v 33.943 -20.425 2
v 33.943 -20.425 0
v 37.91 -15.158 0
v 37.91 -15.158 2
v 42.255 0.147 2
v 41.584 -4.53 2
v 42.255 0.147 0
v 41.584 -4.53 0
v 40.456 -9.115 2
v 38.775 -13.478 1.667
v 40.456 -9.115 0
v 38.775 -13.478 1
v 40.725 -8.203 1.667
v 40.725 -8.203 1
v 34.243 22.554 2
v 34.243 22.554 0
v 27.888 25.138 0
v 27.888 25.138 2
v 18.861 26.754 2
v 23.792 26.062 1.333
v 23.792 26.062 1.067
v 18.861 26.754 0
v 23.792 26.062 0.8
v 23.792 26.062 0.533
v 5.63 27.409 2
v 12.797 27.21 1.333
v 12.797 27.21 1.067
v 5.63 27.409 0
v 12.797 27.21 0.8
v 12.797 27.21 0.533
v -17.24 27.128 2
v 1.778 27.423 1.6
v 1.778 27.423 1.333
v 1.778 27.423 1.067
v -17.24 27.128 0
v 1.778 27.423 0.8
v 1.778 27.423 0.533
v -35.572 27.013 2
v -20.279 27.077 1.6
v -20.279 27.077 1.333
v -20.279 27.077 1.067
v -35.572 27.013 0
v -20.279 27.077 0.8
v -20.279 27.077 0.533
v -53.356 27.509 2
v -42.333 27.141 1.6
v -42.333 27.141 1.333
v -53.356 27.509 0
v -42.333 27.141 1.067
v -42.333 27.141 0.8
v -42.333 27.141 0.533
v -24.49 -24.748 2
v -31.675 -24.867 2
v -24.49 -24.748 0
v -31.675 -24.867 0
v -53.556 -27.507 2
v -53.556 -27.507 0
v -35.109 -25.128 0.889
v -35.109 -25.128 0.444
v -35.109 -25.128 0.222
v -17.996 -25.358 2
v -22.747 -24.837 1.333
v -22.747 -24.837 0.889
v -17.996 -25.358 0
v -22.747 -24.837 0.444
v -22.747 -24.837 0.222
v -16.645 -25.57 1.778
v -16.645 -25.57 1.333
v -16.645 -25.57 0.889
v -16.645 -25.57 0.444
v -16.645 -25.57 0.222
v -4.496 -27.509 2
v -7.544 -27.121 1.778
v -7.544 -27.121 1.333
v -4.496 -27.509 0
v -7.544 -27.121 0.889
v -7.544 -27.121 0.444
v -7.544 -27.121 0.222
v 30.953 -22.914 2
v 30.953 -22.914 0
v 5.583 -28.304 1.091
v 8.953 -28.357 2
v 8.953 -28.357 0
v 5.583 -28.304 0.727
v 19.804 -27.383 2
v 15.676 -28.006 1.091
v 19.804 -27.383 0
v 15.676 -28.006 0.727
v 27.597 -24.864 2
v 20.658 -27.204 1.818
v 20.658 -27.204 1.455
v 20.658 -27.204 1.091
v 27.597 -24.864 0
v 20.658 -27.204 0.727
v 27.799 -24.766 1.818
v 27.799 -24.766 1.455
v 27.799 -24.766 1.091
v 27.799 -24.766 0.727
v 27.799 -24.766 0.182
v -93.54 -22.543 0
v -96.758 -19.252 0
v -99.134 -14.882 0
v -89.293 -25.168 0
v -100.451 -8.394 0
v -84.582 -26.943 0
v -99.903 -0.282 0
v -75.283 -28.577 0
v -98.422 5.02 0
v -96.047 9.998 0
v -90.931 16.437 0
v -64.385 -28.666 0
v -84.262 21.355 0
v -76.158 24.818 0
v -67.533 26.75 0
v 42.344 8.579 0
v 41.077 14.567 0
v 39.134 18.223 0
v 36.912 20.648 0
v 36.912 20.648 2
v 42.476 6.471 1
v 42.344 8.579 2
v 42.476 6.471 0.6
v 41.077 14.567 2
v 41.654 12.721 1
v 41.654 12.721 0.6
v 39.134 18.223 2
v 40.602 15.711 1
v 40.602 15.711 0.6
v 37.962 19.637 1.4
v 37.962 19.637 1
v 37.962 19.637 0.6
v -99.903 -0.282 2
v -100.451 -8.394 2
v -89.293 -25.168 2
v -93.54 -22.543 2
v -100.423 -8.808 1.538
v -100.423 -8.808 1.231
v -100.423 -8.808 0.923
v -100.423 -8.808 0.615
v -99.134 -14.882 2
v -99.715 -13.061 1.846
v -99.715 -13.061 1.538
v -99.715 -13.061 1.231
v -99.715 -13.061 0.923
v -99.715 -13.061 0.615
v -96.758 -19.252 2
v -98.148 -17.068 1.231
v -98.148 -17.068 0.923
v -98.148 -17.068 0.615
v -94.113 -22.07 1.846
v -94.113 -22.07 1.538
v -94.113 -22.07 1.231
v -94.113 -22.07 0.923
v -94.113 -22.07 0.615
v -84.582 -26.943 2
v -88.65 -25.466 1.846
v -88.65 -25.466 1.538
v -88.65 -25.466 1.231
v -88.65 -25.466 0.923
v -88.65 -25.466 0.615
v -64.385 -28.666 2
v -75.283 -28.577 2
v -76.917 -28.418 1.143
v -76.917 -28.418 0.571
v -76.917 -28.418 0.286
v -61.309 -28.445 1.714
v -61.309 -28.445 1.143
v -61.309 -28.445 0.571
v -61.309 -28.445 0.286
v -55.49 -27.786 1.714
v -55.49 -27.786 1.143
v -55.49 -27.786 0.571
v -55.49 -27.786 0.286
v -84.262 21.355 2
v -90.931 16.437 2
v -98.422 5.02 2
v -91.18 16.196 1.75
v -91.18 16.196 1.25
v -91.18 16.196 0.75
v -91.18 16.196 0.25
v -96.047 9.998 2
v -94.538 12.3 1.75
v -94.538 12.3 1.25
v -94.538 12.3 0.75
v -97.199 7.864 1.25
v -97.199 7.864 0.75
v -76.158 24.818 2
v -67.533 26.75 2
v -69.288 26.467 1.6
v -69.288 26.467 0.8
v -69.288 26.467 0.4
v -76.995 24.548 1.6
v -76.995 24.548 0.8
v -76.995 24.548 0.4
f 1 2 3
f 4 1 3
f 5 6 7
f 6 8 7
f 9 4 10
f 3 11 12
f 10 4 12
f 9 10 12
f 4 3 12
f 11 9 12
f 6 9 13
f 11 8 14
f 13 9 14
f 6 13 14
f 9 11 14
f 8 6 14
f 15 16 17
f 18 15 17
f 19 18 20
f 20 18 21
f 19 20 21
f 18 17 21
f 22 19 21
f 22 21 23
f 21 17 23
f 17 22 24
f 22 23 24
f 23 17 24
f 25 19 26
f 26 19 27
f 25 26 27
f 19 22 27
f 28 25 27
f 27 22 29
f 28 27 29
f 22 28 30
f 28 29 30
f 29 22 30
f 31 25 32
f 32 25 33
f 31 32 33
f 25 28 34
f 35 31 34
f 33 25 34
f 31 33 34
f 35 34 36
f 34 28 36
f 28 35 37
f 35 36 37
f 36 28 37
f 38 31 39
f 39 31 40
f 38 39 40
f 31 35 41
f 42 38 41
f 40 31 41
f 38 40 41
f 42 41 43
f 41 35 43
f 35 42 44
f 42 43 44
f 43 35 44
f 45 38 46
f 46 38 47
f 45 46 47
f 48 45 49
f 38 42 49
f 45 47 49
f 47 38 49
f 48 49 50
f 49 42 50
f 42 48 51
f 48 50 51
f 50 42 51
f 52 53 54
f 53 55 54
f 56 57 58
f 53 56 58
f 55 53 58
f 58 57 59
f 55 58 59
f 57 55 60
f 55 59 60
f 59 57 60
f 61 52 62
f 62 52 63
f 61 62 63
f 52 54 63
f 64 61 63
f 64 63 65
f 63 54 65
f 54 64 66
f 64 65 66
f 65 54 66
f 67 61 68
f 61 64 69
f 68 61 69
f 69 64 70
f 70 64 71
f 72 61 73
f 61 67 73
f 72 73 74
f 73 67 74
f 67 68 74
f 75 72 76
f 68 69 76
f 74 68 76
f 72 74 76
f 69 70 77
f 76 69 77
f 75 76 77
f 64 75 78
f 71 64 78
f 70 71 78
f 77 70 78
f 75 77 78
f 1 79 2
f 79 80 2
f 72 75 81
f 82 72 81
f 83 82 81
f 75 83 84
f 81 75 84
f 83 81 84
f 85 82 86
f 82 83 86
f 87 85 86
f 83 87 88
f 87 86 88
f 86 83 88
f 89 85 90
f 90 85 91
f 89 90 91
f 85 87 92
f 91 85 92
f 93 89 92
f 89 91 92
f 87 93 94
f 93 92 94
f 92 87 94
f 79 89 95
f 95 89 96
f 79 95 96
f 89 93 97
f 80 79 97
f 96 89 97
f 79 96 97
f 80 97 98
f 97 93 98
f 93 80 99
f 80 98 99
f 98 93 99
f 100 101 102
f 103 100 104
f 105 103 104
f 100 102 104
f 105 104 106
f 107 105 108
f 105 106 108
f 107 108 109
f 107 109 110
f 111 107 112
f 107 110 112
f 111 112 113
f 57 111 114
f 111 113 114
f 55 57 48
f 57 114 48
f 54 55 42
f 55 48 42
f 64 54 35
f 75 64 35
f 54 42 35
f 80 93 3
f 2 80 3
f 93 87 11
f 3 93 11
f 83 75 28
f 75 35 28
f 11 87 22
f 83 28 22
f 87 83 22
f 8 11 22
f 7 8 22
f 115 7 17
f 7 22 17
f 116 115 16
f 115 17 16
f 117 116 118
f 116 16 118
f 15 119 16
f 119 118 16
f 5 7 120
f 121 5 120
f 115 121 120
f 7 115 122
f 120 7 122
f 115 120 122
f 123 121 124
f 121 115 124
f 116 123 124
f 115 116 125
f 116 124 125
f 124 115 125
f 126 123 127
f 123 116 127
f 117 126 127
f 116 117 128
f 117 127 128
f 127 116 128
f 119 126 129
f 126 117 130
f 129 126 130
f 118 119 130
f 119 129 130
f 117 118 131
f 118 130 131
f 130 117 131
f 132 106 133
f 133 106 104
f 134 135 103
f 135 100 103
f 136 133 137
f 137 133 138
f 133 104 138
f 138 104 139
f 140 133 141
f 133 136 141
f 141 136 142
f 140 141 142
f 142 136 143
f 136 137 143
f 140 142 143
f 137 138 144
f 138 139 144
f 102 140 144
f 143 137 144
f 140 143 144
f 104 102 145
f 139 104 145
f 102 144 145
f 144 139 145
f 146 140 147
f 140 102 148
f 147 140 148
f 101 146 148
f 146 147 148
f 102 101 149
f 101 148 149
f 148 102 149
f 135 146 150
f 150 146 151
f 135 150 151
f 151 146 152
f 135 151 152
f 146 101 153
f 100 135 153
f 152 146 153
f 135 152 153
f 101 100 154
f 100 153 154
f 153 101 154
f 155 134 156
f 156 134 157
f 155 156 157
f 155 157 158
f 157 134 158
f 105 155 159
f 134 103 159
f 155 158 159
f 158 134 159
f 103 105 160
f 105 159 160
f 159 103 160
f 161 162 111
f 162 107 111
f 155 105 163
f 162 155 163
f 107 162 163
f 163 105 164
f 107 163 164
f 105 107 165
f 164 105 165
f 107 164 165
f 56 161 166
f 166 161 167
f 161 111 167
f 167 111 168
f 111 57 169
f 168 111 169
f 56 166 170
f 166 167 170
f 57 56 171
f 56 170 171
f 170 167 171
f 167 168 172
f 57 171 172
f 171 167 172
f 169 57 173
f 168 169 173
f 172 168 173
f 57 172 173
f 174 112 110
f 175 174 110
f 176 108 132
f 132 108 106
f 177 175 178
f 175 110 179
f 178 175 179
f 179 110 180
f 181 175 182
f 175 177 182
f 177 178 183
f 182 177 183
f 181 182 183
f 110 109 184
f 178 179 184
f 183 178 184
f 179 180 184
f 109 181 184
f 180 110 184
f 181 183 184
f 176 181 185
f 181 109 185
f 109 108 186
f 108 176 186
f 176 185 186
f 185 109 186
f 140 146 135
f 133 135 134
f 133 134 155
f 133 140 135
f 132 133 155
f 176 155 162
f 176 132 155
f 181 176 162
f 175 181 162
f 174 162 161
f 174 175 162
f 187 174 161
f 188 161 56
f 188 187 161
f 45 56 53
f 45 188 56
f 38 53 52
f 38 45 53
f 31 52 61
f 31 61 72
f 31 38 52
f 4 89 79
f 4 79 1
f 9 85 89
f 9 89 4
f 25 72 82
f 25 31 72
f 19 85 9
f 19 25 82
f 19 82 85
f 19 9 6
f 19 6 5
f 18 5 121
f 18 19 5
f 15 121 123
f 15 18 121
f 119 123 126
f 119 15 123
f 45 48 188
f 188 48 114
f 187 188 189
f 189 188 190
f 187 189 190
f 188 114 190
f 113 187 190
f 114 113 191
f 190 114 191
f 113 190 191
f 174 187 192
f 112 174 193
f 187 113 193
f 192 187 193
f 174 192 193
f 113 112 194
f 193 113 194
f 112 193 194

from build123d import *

# Parameters (mm, degrees)
BOSS_EXTRUDE1_DEPTH = 2


with BuildPart() as part:
    # Sketch1 → Boss-Extrude1 (new body)
    with BuildSketch(Plane.XY):
        with BuildLine():
            add(Edge.make_bspline(
                [(42.254959693, 0.147059904), (42.358632415, 1.199419601), (42.431093, 2.252519668), (42.507895564, 4.360335613), (42.512403958, 5.415047543), (42.438944283, 7.526427791), (42.360968868, 8.583113716), (42.09865974, 10.66975069), (41.915389515, 11.702985715), (41.523005817, 13.230108257), (41.372062824, 13.735250738), (41.022066924, 14.73622728), (40.822896185, 15.231629468), (40.159240455, 16.669554621), (39.624677549, 17.574204207), (38.670446405, 18.841910545), (38.324763751, 19.251561585), (37.599094102, 20.022250678), (37.217891586, 20.385301348), (36.024008603, 21.413431301), (35.161096788, 22.017542036), (34.242840394, 22.554478016)],
                knots=[0, 0, 0, 0, 0.125, 0.125, 0.25, 0.25, 0.375, 0.375, 0.5, 0.5, 0.5625, 0.5625, 0.625, 0.625, 0.75, 0.75, 0.8125, 0.8125, 0.875, 0.875, 1, 1, 1, 1], degree=3))
            add(Edge.make_bspline(
                [(34.242840394, 22.554478016), (33.432163344, 23.028508667), (32.600124174, 23.438064349), (30.904833088, 24.162969666), (30.041468461, 24.47797912), (27.41581999, 25.315696923), (25.618305059, 25.732071103), (22.878935407, 26.226556605), (21.962590487, 26.36834517), (20.131401643, 26.615298727), (19.215351389, 26.720560508), (16.466137493, 26.993863209), (14.63191251, 27.119493097), (10.961693588, 27.300065699), (9.125685095, 27.354426791), (5.452541451, 27.418127948), (3.615398198, 27.42714421), (-1.897049716, 27.413507708), (-5.573357064, 27.350787708), (-12.926321579, 27.211369022), (-16.602922737, 27.133521657), (-23.955526241, 27.019717914), (-27.631613941, 26.983286898), (-34.982928847, 26.992718318), (-38.658158316, 27.038364256), (-43.251446787, 27.166991695), (-44.170067215, 27.19628112), (-46.007228743, 27.262446519), (-46.925770125, 27.29929548), (-49.681420206, 27.407362262), (-51.518563422, 27.475278936), (-53.356065443, 27.50888127)],
                knots=[0, 0, 0, 0, 0.03125, 0.03125, 0.0625, 0.0625, 0.125, 0.125, 0.15625, 0.15625, 0.1875, 0.1875, 0.25, 0.25, 0.3125, 0.3125, 0.375, 0.375, 0.5, 0.5, 0.625, 0.625, 0.75, 0.75, 0.875, 0.875, 0.90625, 0.90625, 0.9375, 0.9375, 1, 1, 1, 1], degree=3))
            add(Edge.make_bspline(
                [(-53.356065443, 27.50888127), (-56.022208632, 27.557636935), (-58.687136141, 27.53681843), (-64.012146511, 27.217918735), (-66.660366647, 26.927787667), (-70.601424233, 26.237218613), (-71.904117187, 25.965044304), (-74.474456216, 25.328685725), (-75.743641602, 24.96426376), (-79.496955186, 23.714072096), (-81.927745995, 22.673995356), (-84.262184454, 21.355167704)],
                knots=[0, 0, 0, 0, 0.25, 0.25, 0.5, 0.5, 0.625, 0.625, 0.75, 0.75, 1, 1, 1, 1], degree=3))
            add(Edge.make_bspline(
                [(-84.262184454, 21.355167704), (-86.278341457, 20.216151339), (-88.167221142, 18.89851058), (-90.34366433, 16.992307868), (-90.768414988, 16.599049831), (-91.590733965, 15.793897042), (-91.989215087, 15.381213437), (-93.146643825, 14.112857312), (-93.867615548, 13.226910361), (-95.207536565, 11.373684045), (-95.826506992, 10.406421529), (-96.676800294, 8.893216637), (-96.945891985, 8.380577294), (-97.45236363, 7.346658391), (-97.690383073, 6.824254117), (-98.806780685, 4.185861085), (-99.466850905, 1.991755978), (-99.902955458, -0.282489958)],
                knots=[0, 0, 0, 0, 0.25, 0.25, 0.3125, 0.3125, 0.375, 0.375, 0.5, 0.5, 0.625, 0.625, 0.6875, 0.6875, 0.75, 0.75, 1, 1, 1, 1], degree=3))
            add(Edge.make_bspline(
                [(-99.902955458, -0.282489958), (-100.174621796, -1.699205431), (-100.353361942, -3.118023586), (-100.530781956, -5.9597342), (-100.532561332, -7.382556525), (-100.367802656, -9.520578475), (-100.284580608, -10.233892872), (-100.050253317, -11.662057688), (-99.900428704, -12.367976371), (-99.530192584, -13.753930956), (-99.309610645, -14.435173261), (-98.789838053, -15.771646269), (-98.490133116, -16.4279006), (-97.463041163, -18.346936536), (-96.63373901, -19.511855047), (-95.424681248, -20.83151487), (-95.174253541, -21.088626653), (-94.656379787, -21.589379224), (-94.388093213, -21.833728916), (-93.564307826, -22.541526745), (-92.993127018, -22.97746297), (-91.222337094, -24.191738503), (-89.965884486, -24.877204756), (-87.992116497, -25.759847021), (-87.319984861, -26.02933053), (-85.962672705, -26.519685162), (-85.275750706, -26.741373503), (-84.58173062, -26.942891461)],
                knots=[0, 0, 0, 0, 0.125, 0.125, 0.25, 0.25, 0.3125, 0.3125, 0.375, 0.375, 0.4375, 0.4375, 0.5, 0.5, 0.625, 0.625, 0.65625, 0.65625, 0.6875, 0.6875, 0.75, 0.75, 0.875, 0.875, 0.9375, 0.9375, 1, 1, 1, 1], degree=3))
            add(Edge.make_bspline(
                [(-84.58173062, -26.942891461), (-83.326809321, -27.307274542), (-82.058756151, -27.602568632), (-79.502273692, -28.085954606), (-78.213801943, -28.2738231), (-74.323458733, -28.706278362), (-71.719026847, -28.819366471), (-66.501832883, -28.801867744), (-63.90047355, -28.670128954), (-60.012859191, -28.332580381), (-58.719022229, -28.196395499), (-56.781052152, -27.959713991), (-56.13553305, -27.875341554), (-54.84536933, -27.696423192), (-54.200712464, -27.602019753), (-53.556082534, -27.507302947)],
                knots=[0, 0, 0, 0, 0.125, 0.125, 0.25, 0.25, 0.5, 0.5, 0.75, 0.75, 0.875, 0.875, 0.9375, 0.9375, 1, 1, 1, 1], degree=3))
            add(Edge.make_bspline(
                [(-53.556082534, -27.507302947), (-49.465588578, -26.906278231), (-45.375270259, -26.303991445), (-39.2199843, -25.542898217), (-37.166119794, -25.313351344), (-33.050915381, -24.943457655), (-30.989571362, -24.802796264), (-26.853536993, -24.679431241), (-24.793222959, -24.69987176), (-21.723985805, -24.905483185), (-20.704205352, -25.002879486), (-18.670803274, -25.25155515), (-17.657172234, -25.402752145), (-14.621863726, -25.905202423), (-12.605112903, -26.299558503), (-9.571361183, -26.815628995), (-8.558804834, -26.976228369), (-6.530091249, -27.265923265), (-5.513945855, -27.395122387), (-4.496106034, -27.509497112)],
                knots=[0, 0, 0, 0, 0.25, 0.25, 0.375, 0.375, 0.5, 0.5, 0.625, 0.625, 0.6875, 0.6875, 0.75, 0.75, 0.875, 0.875, 0.9375, 0.9375, 1, 1, 1, 1], degree=3))
            add(Edge.make_bspline(
                [(-4.496106034, -27.509497112), (-2.821884664, -27.715285799), (-1.14442964, -27.878916637), (2.215099222, -28.145961833), (3.897362148, -28.246911018), (7.268558764, -28.361841173), (8.954231619, -28.375809142), (12.319177747, -28.287766615), (13.999311803, -28.186071246), (16.514718079, -27.915300175), (17.352991891, -27.805233486), (19.014710967, -27.540206182), (19.839577202, -27.385118383), (22.293798145, -26.843100868), (23.902840376, -26.379662939), (25.868128224, -25.627047386), (26.258870517, -25.467803642), (27.03531838, -25.130345022), (27.420730864, -24.952171991), (28.556481271, -24.393216735), (29.290353849, -23.986272043), (31.417641791, -22.655965297), (32.736351758, -21.622577389), (33.943321367, -20.424618656)],
                knots=[0, 0, 0, 0, 0.125, 0.125, 0.25, 0.25, 0.375, 0.375, 0.5, 0.5, 0.5625, 0.5625, 0.625, 0.625, 0.75, 0.75, 0.78125, 0.78125, 0.8125, 0.8125, 0.875, 0.875, 1, 1, 1, 1], degree=3))
            add(Edge.make_bspline(
                [(33.943321367, -20.424618656), (35.292996532, -19.085019764), (36.448253132, -17.594173169), (37.928392902, -15.161280487), (38.373614318, -14.327377943), (39.177339179, -12.629397714), (39.536733372, -11.763749893), (40.182870032, -10.003957398), (40.469832135, -9.109898874), (40.980178033, -7.296843923), (41.203899109, -6.375966058), (41.789035837, -3.602655454), (42.069485345, -1.73565064), (42.254959693, 0.147059904)],
                knots=[0, 0, 0, 0, 0.25, 0.25, 0.375, 0.375, 0.5, 0.5, 0.625, 0.625, 0.75, 0.75, 1, 1, 1, 1], degree=3))
        make_face()
    extrude(amount=BOSS_EXTRUDE1_DEPTH)


solid = part.part
